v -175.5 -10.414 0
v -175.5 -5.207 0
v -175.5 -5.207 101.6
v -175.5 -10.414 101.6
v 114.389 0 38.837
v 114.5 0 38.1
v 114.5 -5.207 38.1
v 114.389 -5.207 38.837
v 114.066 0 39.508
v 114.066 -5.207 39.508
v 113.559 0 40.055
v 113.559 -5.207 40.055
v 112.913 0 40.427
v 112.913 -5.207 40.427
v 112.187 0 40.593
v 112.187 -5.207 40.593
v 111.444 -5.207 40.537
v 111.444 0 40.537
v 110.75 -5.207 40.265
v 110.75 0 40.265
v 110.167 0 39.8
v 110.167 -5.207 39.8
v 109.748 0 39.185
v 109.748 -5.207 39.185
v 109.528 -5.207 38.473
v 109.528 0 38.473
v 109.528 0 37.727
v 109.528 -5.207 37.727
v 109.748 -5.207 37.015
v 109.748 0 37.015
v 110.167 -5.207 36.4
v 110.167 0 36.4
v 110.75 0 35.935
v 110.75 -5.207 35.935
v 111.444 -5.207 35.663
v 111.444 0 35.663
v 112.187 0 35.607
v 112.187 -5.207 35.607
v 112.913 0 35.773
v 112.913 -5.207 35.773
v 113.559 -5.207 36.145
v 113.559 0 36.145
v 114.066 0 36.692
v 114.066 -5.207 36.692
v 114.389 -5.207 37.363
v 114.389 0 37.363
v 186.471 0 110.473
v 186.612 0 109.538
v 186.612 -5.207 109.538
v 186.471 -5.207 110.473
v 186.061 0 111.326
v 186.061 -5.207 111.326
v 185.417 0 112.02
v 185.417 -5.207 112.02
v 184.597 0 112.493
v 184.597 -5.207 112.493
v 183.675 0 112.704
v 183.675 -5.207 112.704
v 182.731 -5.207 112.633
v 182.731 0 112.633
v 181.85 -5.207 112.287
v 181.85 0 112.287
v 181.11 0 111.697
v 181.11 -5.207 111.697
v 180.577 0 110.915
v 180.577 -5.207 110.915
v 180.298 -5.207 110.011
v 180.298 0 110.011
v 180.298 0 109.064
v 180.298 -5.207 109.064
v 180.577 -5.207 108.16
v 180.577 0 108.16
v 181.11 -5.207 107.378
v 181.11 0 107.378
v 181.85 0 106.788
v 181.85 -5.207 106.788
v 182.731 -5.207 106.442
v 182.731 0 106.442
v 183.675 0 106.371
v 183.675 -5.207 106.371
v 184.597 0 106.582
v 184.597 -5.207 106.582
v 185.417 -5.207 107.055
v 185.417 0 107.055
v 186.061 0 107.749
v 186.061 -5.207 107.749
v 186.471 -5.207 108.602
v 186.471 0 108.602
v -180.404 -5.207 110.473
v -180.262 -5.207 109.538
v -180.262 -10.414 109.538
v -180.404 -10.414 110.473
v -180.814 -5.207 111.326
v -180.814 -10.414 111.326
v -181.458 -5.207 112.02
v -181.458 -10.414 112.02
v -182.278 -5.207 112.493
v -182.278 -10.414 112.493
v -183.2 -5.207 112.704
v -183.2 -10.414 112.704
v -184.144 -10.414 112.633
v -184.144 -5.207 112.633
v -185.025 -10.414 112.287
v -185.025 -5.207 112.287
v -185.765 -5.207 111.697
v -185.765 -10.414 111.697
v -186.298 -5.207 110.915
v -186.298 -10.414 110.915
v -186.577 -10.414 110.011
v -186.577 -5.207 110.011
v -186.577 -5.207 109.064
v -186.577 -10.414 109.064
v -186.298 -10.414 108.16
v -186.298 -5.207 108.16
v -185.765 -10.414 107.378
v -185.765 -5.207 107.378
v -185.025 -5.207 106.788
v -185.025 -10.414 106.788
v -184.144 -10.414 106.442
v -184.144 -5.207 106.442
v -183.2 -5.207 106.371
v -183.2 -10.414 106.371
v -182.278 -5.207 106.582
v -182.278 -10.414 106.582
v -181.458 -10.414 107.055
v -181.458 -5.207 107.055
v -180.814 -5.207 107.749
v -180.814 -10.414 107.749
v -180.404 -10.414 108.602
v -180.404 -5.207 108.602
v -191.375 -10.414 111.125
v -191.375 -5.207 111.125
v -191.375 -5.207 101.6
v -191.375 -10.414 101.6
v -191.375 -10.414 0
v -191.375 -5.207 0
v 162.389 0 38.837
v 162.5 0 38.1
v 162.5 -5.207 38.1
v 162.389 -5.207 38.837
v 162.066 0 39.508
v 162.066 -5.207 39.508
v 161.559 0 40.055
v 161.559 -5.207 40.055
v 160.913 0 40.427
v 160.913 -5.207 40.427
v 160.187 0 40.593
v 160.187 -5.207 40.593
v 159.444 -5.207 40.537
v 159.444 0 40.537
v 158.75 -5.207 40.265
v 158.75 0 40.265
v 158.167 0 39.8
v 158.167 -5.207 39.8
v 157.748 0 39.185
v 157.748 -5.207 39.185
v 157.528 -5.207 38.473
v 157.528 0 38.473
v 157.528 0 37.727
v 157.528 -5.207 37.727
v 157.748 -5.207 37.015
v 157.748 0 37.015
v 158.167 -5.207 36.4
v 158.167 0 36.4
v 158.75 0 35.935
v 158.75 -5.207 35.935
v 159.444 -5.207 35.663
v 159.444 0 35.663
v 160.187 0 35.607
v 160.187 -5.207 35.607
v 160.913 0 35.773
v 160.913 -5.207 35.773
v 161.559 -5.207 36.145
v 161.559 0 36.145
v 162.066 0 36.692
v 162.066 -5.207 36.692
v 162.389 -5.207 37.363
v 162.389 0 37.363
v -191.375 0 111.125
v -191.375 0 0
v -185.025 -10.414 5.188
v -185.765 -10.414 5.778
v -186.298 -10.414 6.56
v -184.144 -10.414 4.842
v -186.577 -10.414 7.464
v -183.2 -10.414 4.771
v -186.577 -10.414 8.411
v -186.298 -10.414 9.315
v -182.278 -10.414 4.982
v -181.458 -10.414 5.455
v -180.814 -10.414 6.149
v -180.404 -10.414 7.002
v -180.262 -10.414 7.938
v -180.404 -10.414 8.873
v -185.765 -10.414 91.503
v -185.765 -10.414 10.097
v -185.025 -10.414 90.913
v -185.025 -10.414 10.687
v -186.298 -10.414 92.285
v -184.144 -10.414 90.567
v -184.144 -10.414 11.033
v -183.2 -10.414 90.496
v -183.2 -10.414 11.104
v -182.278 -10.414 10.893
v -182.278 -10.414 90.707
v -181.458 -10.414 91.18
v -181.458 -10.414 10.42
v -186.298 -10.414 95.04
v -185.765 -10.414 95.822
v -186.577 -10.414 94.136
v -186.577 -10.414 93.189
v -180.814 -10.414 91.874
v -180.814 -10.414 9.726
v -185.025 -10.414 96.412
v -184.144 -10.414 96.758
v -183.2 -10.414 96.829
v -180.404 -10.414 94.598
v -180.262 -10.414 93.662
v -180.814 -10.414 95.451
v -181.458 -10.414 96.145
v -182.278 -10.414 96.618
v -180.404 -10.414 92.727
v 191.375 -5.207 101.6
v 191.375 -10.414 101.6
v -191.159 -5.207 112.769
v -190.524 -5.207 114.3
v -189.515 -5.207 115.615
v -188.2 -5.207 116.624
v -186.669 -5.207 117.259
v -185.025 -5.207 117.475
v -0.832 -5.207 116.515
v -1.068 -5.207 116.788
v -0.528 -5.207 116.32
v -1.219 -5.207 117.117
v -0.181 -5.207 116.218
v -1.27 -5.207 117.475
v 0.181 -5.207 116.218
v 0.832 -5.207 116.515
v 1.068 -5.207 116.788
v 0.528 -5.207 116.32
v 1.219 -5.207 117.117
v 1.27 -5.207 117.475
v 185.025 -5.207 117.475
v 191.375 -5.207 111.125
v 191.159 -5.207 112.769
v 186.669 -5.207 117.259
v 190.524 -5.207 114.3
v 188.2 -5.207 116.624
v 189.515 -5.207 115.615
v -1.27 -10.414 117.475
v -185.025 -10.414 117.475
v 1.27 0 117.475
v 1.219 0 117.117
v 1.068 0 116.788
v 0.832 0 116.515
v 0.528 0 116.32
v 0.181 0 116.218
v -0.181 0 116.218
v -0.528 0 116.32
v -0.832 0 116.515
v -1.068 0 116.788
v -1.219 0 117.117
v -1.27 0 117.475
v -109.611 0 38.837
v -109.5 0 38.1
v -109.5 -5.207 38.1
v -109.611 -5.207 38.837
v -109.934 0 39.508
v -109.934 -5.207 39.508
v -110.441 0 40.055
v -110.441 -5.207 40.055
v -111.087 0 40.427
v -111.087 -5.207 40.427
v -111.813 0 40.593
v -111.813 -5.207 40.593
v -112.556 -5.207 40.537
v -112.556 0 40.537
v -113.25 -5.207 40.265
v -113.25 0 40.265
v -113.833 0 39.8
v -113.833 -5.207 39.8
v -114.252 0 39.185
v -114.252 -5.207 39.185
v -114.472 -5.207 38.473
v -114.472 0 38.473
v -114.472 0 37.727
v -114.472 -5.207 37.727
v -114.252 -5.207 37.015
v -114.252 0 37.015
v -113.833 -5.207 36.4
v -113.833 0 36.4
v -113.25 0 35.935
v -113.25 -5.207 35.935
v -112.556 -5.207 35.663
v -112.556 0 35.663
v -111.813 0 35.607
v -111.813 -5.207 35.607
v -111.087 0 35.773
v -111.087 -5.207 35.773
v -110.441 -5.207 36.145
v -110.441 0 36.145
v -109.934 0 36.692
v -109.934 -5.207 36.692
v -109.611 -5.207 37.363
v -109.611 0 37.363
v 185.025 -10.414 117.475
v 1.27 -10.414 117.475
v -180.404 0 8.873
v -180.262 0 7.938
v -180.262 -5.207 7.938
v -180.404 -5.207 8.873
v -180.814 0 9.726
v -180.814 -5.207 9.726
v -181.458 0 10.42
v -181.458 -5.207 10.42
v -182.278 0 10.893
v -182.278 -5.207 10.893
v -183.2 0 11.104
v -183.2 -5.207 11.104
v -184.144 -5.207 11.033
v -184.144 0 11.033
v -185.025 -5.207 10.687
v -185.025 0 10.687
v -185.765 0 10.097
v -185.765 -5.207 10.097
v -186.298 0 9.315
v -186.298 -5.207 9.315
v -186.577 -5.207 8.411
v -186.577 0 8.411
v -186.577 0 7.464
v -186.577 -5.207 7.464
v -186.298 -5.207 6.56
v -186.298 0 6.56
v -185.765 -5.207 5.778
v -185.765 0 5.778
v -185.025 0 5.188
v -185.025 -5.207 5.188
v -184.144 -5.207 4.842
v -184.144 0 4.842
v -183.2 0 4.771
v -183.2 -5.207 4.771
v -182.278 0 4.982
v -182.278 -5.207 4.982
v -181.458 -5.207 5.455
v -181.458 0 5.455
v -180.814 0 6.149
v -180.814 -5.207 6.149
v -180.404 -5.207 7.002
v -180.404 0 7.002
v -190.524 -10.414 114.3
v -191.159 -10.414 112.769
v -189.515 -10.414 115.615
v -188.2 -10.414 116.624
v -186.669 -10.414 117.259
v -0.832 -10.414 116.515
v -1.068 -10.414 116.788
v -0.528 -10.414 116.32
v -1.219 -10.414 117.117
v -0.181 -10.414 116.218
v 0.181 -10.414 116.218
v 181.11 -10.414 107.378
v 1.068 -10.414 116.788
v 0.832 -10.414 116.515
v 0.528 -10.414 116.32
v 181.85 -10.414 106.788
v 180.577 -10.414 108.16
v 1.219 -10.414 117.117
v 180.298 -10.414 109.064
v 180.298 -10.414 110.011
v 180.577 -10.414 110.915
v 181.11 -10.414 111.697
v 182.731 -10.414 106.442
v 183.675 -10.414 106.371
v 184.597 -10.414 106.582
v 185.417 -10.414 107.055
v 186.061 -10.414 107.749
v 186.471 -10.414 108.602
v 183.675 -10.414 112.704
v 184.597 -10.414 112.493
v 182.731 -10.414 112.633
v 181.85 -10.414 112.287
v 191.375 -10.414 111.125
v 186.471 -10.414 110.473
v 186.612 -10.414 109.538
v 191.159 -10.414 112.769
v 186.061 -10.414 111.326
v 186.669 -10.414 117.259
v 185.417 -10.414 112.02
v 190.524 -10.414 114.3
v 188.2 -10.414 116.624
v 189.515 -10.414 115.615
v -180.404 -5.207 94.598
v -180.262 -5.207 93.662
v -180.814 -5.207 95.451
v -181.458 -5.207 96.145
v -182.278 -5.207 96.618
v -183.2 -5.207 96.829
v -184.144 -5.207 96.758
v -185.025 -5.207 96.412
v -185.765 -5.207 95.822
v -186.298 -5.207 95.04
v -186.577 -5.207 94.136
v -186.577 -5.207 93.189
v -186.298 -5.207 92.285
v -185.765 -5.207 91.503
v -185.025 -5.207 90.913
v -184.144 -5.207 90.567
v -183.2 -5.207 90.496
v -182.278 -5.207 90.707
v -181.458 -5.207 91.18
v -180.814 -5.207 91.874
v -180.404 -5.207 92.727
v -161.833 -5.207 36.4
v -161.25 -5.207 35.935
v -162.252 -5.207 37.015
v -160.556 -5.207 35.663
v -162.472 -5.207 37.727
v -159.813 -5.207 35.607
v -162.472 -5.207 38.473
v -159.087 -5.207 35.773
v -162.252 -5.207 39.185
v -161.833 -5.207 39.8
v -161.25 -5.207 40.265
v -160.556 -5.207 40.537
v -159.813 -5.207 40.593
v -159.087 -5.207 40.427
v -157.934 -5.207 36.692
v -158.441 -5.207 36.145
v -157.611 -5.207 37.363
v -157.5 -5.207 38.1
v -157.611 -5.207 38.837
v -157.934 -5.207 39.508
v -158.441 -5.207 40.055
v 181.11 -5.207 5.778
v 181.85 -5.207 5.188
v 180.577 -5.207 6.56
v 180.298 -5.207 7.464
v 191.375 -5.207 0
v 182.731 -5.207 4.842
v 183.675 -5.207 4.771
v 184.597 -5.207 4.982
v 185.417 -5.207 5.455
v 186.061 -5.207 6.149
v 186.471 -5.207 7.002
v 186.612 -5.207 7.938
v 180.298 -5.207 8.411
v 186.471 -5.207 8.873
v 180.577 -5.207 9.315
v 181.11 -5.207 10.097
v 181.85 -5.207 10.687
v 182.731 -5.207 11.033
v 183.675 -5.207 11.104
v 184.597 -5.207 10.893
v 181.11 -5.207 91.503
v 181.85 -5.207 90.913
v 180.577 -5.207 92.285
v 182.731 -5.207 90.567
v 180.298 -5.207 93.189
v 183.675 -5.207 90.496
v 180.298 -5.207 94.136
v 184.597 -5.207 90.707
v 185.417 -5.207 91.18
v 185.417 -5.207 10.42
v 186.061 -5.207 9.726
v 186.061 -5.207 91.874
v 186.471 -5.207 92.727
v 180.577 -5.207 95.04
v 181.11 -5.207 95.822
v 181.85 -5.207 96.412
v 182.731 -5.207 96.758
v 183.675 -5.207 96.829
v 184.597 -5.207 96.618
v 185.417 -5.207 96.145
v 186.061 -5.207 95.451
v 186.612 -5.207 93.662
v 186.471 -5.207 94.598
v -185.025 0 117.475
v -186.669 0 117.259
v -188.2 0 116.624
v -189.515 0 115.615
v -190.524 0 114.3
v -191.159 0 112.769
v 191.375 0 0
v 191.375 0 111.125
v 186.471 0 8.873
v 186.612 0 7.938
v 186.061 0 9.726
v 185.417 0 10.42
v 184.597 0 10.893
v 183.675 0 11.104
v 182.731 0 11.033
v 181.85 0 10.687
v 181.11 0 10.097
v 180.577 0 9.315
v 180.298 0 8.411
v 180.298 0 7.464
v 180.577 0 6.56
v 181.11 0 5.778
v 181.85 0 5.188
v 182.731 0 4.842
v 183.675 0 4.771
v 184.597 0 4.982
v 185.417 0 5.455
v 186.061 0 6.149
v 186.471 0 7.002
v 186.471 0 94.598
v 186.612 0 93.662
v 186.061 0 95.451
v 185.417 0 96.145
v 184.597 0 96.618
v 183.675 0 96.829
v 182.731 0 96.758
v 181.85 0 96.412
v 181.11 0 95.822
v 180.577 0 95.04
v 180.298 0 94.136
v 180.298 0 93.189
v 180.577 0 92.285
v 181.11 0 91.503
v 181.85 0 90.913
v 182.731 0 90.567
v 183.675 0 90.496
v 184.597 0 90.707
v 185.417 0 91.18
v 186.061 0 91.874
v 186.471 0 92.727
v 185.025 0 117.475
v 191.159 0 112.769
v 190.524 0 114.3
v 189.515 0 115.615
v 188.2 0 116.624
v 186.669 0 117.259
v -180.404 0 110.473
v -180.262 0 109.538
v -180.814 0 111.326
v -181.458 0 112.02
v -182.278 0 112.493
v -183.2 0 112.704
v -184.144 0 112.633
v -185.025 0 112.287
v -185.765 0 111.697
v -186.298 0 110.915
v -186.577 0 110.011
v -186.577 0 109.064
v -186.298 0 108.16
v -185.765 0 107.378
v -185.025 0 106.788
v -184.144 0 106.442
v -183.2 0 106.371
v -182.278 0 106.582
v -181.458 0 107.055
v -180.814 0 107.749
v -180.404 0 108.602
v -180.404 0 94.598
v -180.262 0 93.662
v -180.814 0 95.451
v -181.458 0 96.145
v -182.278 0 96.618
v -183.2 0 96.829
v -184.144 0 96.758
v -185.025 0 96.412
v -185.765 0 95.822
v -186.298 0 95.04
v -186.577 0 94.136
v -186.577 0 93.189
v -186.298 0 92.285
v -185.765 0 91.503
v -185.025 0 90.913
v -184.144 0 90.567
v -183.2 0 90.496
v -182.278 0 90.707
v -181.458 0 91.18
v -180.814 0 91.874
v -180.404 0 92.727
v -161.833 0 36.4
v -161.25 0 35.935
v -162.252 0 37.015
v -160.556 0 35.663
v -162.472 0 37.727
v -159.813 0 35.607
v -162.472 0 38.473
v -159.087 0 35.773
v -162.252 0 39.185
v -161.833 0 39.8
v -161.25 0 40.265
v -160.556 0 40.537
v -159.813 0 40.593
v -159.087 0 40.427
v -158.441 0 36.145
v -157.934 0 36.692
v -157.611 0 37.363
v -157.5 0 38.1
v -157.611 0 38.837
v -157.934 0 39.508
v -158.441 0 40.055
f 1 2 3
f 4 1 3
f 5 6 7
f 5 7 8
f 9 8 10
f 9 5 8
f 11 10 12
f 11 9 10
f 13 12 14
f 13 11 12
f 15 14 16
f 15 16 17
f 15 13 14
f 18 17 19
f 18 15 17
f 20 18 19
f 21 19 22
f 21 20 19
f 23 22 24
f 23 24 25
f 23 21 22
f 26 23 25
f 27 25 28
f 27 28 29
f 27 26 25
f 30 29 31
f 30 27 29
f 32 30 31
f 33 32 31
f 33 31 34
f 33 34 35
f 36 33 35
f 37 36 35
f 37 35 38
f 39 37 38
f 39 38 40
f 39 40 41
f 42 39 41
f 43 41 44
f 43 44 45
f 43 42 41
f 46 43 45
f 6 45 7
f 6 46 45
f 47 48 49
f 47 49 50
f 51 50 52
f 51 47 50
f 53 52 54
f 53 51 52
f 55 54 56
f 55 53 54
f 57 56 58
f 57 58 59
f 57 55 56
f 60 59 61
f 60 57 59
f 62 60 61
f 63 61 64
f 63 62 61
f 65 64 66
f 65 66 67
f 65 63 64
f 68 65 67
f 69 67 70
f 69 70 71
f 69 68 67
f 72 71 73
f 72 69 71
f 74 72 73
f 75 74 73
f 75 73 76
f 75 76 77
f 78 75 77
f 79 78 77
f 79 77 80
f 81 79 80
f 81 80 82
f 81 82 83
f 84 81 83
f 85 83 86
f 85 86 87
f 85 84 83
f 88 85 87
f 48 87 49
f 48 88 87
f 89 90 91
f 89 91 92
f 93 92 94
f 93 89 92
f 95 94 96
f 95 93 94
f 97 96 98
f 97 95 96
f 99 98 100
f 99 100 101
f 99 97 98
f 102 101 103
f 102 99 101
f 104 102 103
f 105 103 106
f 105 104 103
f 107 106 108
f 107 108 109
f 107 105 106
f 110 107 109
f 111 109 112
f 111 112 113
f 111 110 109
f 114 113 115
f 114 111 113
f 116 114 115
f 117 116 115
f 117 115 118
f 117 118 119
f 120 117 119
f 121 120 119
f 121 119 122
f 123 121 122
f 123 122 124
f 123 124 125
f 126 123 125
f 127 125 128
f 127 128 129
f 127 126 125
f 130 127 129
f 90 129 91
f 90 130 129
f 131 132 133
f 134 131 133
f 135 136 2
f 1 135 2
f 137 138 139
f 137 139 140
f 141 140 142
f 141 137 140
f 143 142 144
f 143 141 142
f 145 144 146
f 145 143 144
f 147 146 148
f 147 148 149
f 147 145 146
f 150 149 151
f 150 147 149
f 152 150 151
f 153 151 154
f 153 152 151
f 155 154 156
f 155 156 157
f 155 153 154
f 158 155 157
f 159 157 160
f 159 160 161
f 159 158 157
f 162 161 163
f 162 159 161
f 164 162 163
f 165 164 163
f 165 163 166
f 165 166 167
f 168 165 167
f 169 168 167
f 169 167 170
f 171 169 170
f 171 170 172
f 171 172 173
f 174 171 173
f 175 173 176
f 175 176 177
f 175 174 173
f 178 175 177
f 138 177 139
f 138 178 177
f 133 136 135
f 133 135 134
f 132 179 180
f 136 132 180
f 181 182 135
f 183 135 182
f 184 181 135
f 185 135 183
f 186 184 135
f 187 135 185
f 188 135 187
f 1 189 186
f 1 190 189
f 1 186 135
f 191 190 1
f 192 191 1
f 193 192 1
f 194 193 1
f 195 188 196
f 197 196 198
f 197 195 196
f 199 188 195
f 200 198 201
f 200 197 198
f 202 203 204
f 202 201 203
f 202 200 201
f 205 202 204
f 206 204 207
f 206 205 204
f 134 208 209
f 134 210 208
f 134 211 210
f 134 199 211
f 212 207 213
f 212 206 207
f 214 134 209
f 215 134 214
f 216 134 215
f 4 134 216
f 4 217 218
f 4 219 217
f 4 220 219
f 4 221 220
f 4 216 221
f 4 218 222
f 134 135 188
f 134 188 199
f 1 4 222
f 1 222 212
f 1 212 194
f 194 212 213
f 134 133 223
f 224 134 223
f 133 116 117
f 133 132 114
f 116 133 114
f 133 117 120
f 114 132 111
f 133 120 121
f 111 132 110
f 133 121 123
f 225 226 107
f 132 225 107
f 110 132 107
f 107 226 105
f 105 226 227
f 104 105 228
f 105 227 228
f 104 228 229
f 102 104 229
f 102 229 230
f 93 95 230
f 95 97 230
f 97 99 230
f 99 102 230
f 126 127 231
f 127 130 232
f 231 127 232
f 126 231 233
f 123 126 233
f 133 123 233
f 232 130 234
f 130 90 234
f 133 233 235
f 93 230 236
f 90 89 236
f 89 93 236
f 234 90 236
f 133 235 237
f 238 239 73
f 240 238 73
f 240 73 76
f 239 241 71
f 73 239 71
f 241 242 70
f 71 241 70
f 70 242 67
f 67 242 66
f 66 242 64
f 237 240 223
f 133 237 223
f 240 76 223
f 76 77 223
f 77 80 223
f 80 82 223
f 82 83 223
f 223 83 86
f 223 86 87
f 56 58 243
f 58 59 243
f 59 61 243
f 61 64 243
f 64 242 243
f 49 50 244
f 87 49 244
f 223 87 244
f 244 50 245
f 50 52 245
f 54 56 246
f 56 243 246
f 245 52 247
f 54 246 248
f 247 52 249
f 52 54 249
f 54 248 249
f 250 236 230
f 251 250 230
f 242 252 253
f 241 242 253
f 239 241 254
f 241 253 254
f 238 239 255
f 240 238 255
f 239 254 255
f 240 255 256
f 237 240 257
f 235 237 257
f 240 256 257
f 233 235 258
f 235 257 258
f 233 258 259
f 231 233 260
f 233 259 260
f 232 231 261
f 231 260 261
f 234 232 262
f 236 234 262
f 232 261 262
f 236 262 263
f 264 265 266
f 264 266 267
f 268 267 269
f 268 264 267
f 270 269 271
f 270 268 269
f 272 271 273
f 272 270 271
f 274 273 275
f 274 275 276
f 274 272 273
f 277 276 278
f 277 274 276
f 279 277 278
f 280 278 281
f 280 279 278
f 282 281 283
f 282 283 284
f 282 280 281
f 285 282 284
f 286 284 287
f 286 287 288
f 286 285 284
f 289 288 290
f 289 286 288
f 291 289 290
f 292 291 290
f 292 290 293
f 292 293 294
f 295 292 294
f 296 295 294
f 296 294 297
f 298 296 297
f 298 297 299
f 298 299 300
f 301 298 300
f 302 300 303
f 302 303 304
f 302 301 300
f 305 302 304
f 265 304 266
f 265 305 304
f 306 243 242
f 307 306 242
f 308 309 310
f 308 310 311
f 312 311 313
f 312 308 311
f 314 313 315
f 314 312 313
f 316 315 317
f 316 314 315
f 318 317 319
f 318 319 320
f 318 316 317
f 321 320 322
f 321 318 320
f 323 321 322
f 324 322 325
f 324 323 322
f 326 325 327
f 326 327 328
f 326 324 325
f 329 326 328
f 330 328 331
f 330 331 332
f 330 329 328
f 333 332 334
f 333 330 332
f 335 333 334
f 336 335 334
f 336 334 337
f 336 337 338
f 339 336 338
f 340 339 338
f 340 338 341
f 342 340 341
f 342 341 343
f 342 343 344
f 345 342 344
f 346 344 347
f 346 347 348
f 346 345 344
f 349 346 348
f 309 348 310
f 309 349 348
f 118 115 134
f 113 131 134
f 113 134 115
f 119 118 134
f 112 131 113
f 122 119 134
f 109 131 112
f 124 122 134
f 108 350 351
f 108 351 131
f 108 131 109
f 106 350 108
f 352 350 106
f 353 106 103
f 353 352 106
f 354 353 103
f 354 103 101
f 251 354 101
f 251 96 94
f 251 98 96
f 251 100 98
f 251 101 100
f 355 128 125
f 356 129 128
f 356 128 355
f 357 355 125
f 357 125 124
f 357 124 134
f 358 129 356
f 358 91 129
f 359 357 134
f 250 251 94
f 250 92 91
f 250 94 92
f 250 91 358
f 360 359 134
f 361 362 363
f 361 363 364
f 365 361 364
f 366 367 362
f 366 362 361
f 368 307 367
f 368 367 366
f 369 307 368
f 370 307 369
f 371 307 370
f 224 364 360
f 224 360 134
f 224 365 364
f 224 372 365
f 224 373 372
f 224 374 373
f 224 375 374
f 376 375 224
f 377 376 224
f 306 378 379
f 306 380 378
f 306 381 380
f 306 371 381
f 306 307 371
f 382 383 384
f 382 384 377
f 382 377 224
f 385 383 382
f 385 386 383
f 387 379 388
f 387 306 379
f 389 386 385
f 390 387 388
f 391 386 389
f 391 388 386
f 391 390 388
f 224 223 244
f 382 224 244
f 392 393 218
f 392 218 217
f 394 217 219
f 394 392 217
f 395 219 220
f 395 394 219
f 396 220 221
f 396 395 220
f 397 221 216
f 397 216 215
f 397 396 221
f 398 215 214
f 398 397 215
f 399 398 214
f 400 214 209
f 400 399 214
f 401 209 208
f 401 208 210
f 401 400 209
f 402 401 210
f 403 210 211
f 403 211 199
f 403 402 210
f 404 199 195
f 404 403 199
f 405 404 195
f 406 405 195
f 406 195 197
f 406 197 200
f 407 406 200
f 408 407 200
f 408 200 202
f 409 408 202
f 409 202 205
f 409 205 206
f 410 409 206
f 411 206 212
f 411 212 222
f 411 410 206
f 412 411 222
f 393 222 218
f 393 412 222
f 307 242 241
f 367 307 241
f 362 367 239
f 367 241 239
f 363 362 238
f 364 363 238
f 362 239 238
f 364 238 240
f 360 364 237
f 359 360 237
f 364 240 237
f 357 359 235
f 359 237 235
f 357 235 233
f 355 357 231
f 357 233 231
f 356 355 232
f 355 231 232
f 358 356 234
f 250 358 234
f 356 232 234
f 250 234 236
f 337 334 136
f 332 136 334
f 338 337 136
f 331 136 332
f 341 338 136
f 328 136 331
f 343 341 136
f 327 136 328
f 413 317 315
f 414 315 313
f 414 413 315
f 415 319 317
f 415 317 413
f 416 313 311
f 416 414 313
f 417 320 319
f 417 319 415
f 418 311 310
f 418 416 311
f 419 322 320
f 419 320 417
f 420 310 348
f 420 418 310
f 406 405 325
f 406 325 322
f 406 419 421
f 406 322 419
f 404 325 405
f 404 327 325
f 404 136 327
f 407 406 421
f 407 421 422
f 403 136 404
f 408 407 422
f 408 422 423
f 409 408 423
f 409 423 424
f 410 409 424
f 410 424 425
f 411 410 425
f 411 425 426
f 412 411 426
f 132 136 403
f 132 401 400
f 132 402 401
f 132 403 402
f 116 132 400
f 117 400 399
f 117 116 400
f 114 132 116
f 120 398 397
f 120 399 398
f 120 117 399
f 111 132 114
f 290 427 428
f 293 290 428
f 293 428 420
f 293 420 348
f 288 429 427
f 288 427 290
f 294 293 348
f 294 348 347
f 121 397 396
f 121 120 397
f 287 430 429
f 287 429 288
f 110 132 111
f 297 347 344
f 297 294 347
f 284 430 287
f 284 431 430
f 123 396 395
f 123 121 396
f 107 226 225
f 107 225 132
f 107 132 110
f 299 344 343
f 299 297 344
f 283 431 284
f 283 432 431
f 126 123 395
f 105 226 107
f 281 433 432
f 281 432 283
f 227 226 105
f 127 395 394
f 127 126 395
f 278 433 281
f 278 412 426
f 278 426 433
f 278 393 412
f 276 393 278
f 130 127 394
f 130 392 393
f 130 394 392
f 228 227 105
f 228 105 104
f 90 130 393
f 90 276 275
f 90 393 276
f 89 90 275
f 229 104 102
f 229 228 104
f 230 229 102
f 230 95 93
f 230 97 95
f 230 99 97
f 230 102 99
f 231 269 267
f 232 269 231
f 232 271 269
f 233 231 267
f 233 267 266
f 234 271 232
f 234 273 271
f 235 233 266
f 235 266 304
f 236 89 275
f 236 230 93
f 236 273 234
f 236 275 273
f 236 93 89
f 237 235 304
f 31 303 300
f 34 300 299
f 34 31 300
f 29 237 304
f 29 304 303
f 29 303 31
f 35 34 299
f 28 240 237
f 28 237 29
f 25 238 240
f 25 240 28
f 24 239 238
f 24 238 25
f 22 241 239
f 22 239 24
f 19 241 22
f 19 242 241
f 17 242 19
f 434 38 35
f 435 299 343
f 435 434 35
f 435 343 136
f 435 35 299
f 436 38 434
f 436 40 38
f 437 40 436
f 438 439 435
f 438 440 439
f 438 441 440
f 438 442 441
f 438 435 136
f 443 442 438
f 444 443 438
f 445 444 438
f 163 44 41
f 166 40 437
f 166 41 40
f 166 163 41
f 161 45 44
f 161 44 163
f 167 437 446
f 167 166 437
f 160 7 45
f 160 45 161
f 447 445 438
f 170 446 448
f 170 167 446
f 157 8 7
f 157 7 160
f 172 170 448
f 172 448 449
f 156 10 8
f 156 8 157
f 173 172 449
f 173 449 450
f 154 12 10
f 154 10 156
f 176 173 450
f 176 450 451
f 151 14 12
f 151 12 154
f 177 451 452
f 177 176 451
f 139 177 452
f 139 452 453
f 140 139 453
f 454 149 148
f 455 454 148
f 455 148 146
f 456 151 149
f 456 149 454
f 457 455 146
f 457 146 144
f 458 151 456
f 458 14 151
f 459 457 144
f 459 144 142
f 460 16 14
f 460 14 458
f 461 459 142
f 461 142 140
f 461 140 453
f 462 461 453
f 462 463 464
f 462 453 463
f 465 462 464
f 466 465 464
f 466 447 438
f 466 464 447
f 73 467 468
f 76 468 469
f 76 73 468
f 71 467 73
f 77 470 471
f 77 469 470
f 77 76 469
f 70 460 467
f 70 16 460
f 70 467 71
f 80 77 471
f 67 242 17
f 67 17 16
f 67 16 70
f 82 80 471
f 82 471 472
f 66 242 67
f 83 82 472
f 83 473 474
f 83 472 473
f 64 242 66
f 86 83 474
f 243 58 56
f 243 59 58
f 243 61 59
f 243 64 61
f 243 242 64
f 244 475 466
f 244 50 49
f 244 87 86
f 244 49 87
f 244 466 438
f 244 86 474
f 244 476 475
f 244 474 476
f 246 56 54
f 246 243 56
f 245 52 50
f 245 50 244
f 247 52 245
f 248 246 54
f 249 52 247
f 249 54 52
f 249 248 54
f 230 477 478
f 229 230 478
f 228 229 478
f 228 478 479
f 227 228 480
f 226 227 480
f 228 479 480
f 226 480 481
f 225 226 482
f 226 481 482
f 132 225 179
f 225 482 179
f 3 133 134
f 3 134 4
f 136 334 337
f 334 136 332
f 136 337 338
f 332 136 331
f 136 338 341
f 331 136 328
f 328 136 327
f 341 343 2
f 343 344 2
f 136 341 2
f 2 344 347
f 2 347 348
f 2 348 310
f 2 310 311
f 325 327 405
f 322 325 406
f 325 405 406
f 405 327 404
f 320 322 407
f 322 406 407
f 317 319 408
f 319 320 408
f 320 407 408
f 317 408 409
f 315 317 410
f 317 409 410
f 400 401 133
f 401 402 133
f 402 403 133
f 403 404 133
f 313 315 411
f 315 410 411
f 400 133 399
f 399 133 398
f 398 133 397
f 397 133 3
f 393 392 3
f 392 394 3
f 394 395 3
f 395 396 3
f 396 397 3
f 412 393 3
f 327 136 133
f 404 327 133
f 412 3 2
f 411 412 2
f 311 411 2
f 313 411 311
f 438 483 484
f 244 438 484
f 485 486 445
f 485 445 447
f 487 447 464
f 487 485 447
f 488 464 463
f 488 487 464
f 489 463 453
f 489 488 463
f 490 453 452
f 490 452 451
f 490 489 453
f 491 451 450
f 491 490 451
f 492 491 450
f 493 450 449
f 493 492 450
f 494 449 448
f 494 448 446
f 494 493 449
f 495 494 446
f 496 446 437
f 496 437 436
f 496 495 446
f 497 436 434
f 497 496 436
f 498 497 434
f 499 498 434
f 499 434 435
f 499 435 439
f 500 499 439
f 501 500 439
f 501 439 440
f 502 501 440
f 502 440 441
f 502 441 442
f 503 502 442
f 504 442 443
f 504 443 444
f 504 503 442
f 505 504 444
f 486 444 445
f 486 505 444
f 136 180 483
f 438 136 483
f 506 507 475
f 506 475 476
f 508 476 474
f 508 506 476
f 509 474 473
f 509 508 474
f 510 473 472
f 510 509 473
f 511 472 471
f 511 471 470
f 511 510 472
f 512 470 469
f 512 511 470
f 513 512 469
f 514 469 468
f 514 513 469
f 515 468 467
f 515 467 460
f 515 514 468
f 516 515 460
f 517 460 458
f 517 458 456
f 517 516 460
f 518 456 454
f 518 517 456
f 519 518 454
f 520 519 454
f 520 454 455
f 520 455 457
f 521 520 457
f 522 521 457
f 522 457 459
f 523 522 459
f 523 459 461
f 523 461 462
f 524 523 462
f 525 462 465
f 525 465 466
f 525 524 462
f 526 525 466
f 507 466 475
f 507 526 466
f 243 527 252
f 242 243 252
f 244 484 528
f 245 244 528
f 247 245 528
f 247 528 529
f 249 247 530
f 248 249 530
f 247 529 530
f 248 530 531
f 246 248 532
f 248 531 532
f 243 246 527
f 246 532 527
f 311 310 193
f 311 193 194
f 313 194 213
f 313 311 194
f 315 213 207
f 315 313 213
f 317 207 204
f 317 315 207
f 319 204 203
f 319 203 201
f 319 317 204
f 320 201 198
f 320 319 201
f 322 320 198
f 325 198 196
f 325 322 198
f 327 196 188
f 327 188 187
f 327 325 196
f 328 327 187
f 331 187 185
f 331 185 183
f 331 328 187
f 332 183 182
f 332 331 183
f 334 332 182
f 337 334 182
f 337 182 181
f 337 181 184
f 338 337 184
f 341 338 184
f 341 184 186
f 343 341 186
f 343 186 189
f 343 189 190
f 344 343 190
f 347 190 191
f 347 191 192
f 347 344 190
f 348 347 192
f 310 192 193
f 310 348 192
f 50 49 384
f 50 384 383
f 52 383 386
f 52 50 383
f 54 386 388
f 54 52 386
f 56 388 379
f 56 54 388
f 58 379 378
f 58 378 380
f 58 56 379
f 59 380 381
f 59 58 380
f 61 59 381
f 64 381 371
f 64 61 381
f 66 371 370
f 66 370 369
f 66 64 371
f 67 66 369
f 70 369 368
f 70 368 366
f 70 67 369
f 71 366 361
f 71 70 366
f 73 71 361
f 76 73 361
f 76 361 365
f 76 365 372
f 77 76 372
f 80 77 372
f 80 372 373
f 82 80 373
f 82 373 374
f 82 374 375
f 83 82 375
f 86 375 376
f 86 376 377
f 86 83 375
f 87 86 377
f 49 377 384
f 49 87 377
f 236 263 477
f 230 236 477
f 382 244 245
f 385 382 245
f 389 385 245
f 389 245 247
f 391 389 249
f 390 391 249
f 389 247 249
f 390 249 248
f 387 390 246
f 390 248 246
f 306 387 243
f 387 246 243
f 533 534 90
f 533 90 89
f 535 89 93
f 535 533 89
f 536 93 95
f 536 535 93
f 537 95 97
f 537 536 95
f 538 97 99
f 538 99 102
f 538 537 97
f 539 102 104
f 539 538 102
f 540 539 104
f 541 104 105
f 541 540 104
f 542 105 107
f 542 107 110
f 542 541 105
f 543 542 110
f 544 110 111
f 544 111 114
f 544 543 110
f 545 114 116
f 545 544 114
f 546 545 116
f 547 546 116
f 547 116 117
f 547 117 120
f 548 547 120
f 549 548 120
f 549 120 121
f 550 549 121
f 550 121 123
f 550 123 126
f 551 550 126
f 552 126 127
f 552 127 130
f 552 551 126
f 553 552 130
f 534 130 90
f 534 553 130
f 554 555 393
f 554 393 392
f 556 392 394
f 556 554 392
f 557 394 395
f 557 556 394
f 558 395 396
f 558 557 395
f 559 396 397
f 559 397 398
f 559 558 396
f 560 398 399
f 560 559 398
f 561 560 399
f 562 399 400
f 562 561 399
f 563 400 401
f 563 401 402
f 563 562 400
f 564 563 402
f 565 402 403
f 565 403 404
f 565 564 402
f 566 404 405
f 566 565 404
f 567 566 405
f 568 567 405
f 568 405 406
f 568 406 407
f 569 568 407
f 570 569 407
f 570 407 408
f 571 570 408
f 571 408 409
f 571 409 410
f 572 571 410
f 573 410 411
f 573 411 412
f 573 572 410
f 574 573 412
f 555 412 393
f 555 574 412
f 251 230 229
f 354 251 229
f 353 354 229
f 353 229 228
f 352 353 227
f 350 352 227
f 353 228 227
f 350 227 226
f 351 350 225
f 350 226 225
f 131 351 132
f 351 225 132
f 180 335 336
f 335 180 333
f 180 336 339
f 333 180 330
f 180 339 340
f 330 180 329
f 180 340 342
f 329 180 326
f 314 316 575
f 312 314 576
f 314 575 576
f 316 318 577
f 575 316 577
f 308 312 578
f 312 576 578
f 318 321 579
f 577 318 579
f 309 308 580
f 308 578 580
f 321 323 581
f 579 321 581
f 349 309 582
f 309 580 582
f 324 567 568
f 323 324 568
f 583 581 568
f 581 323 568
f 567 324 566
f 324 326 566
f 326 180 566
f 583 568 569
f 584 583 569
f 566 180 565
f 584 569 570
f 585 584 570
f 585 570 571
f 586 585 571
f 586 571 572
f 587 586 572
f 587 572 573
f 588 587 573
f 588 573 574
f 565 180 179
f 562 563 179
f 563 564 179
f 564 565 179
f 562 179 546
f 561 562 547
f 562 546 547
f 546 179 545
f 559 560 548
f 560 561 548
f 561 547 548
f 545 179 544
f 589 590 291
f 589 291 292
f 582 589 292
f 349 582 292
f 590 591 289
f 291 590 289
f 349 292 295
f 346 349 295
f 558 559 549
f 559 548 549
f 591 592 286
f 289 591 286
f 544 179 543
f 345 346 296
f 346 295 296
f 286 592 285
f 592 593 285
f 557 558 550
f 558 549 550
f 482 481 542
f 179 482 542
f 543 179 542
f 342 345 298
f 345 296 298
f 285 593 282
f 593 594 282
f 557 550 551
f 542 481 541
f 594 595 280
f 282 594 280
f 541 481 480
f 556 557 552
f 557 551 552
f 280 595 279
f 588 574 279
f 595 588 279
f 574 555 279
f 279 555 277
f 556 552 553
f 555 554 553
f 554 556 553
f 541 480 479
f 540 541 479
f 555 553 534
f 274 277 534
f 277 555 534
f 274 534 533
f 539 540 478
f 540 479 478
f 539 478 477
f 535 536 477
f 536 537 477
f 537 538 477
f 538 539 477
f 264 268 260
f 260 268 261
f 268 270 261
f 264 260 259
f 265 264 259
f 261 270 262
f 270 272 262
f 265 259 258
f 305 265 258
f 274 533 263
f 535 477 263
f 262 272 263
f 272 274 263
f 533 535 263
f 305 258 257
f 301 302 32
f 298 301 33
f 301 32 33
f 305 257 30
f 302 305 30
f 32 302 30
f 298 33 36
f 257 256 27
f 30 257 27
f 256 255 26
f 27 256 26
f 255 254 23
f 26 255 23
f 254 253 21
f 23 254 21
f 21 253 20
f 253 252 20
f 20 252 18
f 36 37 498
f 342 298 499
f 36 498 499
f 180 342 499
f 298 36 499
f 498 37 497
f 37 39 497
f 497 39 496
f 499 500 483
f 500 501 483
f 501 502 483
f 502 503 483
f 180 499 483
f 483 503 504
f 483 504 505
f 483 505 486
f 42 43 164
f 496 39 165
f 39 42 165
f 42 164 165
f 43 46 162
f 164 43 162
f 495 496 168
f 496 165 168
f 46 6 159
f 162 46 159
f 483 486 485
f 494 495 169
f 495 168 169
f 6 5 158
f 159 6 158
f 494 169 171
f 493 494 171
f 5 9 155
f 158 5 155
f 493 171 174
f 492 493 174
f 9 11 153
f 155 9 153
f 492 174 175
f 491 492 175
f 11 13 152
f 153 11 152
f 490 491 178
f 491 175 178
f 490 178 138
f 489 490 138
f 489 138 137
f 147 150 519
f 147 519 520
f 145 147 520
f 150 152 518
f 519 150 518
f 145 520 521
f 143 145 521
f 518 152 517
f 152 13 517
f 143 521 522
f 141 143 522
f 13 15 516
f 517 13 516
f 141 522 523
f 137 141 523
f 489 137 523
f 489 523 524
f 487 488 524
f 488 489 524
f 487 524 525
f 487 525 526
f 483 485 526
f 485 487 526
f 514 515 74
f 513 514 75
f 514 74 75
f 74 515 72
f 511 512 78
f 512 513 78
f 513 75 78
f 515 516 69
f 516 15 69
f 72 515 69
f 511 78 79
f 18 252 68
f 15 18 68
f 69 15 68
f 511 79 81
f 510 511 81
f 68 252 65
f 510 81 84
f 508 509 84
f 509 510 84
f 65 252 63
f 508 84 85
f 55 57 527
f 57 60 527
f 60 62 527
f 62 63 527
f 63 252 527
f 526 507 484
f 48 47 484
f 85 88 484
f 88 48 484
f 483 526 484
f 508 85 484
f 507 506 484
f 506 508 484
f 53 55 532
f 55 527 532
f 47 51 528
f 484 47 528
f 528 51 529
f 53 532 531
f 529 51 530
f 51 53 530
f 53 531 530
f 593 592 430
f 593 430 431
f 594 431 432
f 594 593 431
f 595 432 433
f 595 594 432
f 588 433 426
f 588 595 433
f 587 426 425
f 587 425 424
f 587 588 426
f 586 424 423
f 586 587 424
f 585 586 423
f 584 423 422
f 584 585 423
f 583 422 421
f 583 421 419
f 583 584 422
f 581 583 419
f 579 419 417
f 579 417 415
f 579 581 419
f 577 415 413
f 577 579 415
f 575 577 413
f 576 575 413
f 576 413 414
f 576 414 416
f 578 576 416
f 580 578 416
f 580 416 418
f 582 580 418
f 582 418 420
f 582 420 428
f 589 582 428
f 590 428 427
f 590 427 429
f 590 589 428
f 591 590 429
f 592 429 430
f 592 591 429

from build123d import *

# Parameters (mm, degrees)
F2_R     = 3.175
F2_R_2   = 2.5
F3_DEPTH = 5.207
F4_R     = 3.175
F5_DEPTH = 5.207
F6_W     = 15.875
F6_H     = 101.6
F6_R     = 3.175
F7_DEPTH = 5.207


with BuildPart() as f3:
    # F2 (on Front) → F3 (new body)
    with BuildSketch(Plane.XZ):
        with BuildLine():
            Line((-1.27, 117.475), (-185.025, 117.475))
            ThreePointArc((-185.025, 117.475), (-189.5151280605, 115.6151280605), (-191.375, 111.125))
            Line((-191.375, 111.125), (-191.375, 0))
            Line((-191.375, 0), (191.375, 0))
            Line((191.375, 0), (191.375, 111.125))
            ThreePointArc((191.375, 111.125), (189.5151280605, 115.6151280605), (185.025, 117.475))
            Line((185.025, 117.475), (1.27, 117.475))
            ThreePointArc((1.27, 117.475), (0, 116.205), (-1.27, 117.475))
        make_face()
        with Locations((-183.4375, 7.9375)):
            Circle(F2_R, mode=Mode.SUBTRACT)
        with Locations((-160, 38.1)):
            Circle(F2_R_2, mode=Mode.SUBTRACT)
        with Locations((-112, 38.1)):
            Circle(F2_R_2, mode=Mode.SUBTRACT)
        with Locations((183.4375, 7.9375)):
            Circle(F2_R, mode=Mode.SUBTRACT)
        with Locations((112, 38.1)):
            Circle(F2_R_2, mode=Mode.SUBTRACT)
        with Locations((160, 38.1)):
            Circle(F2_R_2, mode=Mode.SUBTRACT)
        with Locations((-183.4375, 93.6625)):
            Circle(F2_R, mode=Mode.SUBTRACT)
        with Locations((-183.4375, 109.5375)):
            Circle(F2_R, mode=Mode.SUBTRACT)
        with Locations((183.4375, 93.6625)):
            Circle(F2_R, mode=Mode.SUBTRACT)
        with Locations((183.4375, 109.5375)):
            Circle(F2_R, mode=Mode.SUBTRACT)
    extrude(amount=F3_DEPTH)


with BuildPart() as f5:
    # F4 (on face) → F5 (new body)
    with BuildSketch(Plane.XZ.offset(5.207)):
        with BuildLine():
            Line((185.025, 117.475), (1.27, 117.475))
            ThreePointArc((1.27, 117.475), (0, 116.205), (-1.27, 117.475))
            Line((-1.27, 117.475), (-185.025, 117.475))
            ThreePointArc((-185.025, 117.475), (-189.5151280605, 115.6151280605), (-191.375, 111.125))
            Line((-191.375, 111.125), (-191.375, 101.6))
            Line((-191.375, 101.6), (191.375, 101.6))
            Line((191.375, 101.6), (191.375, 111.125))
            ThreePointArc((191.375, 111.125), (189.5151280605, 115.6151280605), (185.025, 117.475))
        make_face()
        with Locations((-183.4375, 109.5375)):
            Circle(F4_R, mode=Mode.SUBTRACT)
        with Locations((183.4375, 109.5375)):
            Circle(F4_R, mode=Mode.SUBTRACT)
    extrude(amount=F5_DEPTH)


with BuildPart() as f7:
    # F6 (on face) → F7 (new body)
    with BuildSketch(Plane.XZ.offset(5.207)):
        with Locations((-183.4375, 50.8)):
            Rectangle(F6_W, F6_H)
        with Locations((-183.4375, 7.9375)):
            Circle(F6_R, mode=Mode.SUBTRACT)
        with Locations((-183.4375, 93.6625)):
            Circle(F6_R, mode=Mode.SUBTRACT)
    extrude(amount=F7_DEPTH)


solid = Compound([f3.part, f5.part, f7.part])
